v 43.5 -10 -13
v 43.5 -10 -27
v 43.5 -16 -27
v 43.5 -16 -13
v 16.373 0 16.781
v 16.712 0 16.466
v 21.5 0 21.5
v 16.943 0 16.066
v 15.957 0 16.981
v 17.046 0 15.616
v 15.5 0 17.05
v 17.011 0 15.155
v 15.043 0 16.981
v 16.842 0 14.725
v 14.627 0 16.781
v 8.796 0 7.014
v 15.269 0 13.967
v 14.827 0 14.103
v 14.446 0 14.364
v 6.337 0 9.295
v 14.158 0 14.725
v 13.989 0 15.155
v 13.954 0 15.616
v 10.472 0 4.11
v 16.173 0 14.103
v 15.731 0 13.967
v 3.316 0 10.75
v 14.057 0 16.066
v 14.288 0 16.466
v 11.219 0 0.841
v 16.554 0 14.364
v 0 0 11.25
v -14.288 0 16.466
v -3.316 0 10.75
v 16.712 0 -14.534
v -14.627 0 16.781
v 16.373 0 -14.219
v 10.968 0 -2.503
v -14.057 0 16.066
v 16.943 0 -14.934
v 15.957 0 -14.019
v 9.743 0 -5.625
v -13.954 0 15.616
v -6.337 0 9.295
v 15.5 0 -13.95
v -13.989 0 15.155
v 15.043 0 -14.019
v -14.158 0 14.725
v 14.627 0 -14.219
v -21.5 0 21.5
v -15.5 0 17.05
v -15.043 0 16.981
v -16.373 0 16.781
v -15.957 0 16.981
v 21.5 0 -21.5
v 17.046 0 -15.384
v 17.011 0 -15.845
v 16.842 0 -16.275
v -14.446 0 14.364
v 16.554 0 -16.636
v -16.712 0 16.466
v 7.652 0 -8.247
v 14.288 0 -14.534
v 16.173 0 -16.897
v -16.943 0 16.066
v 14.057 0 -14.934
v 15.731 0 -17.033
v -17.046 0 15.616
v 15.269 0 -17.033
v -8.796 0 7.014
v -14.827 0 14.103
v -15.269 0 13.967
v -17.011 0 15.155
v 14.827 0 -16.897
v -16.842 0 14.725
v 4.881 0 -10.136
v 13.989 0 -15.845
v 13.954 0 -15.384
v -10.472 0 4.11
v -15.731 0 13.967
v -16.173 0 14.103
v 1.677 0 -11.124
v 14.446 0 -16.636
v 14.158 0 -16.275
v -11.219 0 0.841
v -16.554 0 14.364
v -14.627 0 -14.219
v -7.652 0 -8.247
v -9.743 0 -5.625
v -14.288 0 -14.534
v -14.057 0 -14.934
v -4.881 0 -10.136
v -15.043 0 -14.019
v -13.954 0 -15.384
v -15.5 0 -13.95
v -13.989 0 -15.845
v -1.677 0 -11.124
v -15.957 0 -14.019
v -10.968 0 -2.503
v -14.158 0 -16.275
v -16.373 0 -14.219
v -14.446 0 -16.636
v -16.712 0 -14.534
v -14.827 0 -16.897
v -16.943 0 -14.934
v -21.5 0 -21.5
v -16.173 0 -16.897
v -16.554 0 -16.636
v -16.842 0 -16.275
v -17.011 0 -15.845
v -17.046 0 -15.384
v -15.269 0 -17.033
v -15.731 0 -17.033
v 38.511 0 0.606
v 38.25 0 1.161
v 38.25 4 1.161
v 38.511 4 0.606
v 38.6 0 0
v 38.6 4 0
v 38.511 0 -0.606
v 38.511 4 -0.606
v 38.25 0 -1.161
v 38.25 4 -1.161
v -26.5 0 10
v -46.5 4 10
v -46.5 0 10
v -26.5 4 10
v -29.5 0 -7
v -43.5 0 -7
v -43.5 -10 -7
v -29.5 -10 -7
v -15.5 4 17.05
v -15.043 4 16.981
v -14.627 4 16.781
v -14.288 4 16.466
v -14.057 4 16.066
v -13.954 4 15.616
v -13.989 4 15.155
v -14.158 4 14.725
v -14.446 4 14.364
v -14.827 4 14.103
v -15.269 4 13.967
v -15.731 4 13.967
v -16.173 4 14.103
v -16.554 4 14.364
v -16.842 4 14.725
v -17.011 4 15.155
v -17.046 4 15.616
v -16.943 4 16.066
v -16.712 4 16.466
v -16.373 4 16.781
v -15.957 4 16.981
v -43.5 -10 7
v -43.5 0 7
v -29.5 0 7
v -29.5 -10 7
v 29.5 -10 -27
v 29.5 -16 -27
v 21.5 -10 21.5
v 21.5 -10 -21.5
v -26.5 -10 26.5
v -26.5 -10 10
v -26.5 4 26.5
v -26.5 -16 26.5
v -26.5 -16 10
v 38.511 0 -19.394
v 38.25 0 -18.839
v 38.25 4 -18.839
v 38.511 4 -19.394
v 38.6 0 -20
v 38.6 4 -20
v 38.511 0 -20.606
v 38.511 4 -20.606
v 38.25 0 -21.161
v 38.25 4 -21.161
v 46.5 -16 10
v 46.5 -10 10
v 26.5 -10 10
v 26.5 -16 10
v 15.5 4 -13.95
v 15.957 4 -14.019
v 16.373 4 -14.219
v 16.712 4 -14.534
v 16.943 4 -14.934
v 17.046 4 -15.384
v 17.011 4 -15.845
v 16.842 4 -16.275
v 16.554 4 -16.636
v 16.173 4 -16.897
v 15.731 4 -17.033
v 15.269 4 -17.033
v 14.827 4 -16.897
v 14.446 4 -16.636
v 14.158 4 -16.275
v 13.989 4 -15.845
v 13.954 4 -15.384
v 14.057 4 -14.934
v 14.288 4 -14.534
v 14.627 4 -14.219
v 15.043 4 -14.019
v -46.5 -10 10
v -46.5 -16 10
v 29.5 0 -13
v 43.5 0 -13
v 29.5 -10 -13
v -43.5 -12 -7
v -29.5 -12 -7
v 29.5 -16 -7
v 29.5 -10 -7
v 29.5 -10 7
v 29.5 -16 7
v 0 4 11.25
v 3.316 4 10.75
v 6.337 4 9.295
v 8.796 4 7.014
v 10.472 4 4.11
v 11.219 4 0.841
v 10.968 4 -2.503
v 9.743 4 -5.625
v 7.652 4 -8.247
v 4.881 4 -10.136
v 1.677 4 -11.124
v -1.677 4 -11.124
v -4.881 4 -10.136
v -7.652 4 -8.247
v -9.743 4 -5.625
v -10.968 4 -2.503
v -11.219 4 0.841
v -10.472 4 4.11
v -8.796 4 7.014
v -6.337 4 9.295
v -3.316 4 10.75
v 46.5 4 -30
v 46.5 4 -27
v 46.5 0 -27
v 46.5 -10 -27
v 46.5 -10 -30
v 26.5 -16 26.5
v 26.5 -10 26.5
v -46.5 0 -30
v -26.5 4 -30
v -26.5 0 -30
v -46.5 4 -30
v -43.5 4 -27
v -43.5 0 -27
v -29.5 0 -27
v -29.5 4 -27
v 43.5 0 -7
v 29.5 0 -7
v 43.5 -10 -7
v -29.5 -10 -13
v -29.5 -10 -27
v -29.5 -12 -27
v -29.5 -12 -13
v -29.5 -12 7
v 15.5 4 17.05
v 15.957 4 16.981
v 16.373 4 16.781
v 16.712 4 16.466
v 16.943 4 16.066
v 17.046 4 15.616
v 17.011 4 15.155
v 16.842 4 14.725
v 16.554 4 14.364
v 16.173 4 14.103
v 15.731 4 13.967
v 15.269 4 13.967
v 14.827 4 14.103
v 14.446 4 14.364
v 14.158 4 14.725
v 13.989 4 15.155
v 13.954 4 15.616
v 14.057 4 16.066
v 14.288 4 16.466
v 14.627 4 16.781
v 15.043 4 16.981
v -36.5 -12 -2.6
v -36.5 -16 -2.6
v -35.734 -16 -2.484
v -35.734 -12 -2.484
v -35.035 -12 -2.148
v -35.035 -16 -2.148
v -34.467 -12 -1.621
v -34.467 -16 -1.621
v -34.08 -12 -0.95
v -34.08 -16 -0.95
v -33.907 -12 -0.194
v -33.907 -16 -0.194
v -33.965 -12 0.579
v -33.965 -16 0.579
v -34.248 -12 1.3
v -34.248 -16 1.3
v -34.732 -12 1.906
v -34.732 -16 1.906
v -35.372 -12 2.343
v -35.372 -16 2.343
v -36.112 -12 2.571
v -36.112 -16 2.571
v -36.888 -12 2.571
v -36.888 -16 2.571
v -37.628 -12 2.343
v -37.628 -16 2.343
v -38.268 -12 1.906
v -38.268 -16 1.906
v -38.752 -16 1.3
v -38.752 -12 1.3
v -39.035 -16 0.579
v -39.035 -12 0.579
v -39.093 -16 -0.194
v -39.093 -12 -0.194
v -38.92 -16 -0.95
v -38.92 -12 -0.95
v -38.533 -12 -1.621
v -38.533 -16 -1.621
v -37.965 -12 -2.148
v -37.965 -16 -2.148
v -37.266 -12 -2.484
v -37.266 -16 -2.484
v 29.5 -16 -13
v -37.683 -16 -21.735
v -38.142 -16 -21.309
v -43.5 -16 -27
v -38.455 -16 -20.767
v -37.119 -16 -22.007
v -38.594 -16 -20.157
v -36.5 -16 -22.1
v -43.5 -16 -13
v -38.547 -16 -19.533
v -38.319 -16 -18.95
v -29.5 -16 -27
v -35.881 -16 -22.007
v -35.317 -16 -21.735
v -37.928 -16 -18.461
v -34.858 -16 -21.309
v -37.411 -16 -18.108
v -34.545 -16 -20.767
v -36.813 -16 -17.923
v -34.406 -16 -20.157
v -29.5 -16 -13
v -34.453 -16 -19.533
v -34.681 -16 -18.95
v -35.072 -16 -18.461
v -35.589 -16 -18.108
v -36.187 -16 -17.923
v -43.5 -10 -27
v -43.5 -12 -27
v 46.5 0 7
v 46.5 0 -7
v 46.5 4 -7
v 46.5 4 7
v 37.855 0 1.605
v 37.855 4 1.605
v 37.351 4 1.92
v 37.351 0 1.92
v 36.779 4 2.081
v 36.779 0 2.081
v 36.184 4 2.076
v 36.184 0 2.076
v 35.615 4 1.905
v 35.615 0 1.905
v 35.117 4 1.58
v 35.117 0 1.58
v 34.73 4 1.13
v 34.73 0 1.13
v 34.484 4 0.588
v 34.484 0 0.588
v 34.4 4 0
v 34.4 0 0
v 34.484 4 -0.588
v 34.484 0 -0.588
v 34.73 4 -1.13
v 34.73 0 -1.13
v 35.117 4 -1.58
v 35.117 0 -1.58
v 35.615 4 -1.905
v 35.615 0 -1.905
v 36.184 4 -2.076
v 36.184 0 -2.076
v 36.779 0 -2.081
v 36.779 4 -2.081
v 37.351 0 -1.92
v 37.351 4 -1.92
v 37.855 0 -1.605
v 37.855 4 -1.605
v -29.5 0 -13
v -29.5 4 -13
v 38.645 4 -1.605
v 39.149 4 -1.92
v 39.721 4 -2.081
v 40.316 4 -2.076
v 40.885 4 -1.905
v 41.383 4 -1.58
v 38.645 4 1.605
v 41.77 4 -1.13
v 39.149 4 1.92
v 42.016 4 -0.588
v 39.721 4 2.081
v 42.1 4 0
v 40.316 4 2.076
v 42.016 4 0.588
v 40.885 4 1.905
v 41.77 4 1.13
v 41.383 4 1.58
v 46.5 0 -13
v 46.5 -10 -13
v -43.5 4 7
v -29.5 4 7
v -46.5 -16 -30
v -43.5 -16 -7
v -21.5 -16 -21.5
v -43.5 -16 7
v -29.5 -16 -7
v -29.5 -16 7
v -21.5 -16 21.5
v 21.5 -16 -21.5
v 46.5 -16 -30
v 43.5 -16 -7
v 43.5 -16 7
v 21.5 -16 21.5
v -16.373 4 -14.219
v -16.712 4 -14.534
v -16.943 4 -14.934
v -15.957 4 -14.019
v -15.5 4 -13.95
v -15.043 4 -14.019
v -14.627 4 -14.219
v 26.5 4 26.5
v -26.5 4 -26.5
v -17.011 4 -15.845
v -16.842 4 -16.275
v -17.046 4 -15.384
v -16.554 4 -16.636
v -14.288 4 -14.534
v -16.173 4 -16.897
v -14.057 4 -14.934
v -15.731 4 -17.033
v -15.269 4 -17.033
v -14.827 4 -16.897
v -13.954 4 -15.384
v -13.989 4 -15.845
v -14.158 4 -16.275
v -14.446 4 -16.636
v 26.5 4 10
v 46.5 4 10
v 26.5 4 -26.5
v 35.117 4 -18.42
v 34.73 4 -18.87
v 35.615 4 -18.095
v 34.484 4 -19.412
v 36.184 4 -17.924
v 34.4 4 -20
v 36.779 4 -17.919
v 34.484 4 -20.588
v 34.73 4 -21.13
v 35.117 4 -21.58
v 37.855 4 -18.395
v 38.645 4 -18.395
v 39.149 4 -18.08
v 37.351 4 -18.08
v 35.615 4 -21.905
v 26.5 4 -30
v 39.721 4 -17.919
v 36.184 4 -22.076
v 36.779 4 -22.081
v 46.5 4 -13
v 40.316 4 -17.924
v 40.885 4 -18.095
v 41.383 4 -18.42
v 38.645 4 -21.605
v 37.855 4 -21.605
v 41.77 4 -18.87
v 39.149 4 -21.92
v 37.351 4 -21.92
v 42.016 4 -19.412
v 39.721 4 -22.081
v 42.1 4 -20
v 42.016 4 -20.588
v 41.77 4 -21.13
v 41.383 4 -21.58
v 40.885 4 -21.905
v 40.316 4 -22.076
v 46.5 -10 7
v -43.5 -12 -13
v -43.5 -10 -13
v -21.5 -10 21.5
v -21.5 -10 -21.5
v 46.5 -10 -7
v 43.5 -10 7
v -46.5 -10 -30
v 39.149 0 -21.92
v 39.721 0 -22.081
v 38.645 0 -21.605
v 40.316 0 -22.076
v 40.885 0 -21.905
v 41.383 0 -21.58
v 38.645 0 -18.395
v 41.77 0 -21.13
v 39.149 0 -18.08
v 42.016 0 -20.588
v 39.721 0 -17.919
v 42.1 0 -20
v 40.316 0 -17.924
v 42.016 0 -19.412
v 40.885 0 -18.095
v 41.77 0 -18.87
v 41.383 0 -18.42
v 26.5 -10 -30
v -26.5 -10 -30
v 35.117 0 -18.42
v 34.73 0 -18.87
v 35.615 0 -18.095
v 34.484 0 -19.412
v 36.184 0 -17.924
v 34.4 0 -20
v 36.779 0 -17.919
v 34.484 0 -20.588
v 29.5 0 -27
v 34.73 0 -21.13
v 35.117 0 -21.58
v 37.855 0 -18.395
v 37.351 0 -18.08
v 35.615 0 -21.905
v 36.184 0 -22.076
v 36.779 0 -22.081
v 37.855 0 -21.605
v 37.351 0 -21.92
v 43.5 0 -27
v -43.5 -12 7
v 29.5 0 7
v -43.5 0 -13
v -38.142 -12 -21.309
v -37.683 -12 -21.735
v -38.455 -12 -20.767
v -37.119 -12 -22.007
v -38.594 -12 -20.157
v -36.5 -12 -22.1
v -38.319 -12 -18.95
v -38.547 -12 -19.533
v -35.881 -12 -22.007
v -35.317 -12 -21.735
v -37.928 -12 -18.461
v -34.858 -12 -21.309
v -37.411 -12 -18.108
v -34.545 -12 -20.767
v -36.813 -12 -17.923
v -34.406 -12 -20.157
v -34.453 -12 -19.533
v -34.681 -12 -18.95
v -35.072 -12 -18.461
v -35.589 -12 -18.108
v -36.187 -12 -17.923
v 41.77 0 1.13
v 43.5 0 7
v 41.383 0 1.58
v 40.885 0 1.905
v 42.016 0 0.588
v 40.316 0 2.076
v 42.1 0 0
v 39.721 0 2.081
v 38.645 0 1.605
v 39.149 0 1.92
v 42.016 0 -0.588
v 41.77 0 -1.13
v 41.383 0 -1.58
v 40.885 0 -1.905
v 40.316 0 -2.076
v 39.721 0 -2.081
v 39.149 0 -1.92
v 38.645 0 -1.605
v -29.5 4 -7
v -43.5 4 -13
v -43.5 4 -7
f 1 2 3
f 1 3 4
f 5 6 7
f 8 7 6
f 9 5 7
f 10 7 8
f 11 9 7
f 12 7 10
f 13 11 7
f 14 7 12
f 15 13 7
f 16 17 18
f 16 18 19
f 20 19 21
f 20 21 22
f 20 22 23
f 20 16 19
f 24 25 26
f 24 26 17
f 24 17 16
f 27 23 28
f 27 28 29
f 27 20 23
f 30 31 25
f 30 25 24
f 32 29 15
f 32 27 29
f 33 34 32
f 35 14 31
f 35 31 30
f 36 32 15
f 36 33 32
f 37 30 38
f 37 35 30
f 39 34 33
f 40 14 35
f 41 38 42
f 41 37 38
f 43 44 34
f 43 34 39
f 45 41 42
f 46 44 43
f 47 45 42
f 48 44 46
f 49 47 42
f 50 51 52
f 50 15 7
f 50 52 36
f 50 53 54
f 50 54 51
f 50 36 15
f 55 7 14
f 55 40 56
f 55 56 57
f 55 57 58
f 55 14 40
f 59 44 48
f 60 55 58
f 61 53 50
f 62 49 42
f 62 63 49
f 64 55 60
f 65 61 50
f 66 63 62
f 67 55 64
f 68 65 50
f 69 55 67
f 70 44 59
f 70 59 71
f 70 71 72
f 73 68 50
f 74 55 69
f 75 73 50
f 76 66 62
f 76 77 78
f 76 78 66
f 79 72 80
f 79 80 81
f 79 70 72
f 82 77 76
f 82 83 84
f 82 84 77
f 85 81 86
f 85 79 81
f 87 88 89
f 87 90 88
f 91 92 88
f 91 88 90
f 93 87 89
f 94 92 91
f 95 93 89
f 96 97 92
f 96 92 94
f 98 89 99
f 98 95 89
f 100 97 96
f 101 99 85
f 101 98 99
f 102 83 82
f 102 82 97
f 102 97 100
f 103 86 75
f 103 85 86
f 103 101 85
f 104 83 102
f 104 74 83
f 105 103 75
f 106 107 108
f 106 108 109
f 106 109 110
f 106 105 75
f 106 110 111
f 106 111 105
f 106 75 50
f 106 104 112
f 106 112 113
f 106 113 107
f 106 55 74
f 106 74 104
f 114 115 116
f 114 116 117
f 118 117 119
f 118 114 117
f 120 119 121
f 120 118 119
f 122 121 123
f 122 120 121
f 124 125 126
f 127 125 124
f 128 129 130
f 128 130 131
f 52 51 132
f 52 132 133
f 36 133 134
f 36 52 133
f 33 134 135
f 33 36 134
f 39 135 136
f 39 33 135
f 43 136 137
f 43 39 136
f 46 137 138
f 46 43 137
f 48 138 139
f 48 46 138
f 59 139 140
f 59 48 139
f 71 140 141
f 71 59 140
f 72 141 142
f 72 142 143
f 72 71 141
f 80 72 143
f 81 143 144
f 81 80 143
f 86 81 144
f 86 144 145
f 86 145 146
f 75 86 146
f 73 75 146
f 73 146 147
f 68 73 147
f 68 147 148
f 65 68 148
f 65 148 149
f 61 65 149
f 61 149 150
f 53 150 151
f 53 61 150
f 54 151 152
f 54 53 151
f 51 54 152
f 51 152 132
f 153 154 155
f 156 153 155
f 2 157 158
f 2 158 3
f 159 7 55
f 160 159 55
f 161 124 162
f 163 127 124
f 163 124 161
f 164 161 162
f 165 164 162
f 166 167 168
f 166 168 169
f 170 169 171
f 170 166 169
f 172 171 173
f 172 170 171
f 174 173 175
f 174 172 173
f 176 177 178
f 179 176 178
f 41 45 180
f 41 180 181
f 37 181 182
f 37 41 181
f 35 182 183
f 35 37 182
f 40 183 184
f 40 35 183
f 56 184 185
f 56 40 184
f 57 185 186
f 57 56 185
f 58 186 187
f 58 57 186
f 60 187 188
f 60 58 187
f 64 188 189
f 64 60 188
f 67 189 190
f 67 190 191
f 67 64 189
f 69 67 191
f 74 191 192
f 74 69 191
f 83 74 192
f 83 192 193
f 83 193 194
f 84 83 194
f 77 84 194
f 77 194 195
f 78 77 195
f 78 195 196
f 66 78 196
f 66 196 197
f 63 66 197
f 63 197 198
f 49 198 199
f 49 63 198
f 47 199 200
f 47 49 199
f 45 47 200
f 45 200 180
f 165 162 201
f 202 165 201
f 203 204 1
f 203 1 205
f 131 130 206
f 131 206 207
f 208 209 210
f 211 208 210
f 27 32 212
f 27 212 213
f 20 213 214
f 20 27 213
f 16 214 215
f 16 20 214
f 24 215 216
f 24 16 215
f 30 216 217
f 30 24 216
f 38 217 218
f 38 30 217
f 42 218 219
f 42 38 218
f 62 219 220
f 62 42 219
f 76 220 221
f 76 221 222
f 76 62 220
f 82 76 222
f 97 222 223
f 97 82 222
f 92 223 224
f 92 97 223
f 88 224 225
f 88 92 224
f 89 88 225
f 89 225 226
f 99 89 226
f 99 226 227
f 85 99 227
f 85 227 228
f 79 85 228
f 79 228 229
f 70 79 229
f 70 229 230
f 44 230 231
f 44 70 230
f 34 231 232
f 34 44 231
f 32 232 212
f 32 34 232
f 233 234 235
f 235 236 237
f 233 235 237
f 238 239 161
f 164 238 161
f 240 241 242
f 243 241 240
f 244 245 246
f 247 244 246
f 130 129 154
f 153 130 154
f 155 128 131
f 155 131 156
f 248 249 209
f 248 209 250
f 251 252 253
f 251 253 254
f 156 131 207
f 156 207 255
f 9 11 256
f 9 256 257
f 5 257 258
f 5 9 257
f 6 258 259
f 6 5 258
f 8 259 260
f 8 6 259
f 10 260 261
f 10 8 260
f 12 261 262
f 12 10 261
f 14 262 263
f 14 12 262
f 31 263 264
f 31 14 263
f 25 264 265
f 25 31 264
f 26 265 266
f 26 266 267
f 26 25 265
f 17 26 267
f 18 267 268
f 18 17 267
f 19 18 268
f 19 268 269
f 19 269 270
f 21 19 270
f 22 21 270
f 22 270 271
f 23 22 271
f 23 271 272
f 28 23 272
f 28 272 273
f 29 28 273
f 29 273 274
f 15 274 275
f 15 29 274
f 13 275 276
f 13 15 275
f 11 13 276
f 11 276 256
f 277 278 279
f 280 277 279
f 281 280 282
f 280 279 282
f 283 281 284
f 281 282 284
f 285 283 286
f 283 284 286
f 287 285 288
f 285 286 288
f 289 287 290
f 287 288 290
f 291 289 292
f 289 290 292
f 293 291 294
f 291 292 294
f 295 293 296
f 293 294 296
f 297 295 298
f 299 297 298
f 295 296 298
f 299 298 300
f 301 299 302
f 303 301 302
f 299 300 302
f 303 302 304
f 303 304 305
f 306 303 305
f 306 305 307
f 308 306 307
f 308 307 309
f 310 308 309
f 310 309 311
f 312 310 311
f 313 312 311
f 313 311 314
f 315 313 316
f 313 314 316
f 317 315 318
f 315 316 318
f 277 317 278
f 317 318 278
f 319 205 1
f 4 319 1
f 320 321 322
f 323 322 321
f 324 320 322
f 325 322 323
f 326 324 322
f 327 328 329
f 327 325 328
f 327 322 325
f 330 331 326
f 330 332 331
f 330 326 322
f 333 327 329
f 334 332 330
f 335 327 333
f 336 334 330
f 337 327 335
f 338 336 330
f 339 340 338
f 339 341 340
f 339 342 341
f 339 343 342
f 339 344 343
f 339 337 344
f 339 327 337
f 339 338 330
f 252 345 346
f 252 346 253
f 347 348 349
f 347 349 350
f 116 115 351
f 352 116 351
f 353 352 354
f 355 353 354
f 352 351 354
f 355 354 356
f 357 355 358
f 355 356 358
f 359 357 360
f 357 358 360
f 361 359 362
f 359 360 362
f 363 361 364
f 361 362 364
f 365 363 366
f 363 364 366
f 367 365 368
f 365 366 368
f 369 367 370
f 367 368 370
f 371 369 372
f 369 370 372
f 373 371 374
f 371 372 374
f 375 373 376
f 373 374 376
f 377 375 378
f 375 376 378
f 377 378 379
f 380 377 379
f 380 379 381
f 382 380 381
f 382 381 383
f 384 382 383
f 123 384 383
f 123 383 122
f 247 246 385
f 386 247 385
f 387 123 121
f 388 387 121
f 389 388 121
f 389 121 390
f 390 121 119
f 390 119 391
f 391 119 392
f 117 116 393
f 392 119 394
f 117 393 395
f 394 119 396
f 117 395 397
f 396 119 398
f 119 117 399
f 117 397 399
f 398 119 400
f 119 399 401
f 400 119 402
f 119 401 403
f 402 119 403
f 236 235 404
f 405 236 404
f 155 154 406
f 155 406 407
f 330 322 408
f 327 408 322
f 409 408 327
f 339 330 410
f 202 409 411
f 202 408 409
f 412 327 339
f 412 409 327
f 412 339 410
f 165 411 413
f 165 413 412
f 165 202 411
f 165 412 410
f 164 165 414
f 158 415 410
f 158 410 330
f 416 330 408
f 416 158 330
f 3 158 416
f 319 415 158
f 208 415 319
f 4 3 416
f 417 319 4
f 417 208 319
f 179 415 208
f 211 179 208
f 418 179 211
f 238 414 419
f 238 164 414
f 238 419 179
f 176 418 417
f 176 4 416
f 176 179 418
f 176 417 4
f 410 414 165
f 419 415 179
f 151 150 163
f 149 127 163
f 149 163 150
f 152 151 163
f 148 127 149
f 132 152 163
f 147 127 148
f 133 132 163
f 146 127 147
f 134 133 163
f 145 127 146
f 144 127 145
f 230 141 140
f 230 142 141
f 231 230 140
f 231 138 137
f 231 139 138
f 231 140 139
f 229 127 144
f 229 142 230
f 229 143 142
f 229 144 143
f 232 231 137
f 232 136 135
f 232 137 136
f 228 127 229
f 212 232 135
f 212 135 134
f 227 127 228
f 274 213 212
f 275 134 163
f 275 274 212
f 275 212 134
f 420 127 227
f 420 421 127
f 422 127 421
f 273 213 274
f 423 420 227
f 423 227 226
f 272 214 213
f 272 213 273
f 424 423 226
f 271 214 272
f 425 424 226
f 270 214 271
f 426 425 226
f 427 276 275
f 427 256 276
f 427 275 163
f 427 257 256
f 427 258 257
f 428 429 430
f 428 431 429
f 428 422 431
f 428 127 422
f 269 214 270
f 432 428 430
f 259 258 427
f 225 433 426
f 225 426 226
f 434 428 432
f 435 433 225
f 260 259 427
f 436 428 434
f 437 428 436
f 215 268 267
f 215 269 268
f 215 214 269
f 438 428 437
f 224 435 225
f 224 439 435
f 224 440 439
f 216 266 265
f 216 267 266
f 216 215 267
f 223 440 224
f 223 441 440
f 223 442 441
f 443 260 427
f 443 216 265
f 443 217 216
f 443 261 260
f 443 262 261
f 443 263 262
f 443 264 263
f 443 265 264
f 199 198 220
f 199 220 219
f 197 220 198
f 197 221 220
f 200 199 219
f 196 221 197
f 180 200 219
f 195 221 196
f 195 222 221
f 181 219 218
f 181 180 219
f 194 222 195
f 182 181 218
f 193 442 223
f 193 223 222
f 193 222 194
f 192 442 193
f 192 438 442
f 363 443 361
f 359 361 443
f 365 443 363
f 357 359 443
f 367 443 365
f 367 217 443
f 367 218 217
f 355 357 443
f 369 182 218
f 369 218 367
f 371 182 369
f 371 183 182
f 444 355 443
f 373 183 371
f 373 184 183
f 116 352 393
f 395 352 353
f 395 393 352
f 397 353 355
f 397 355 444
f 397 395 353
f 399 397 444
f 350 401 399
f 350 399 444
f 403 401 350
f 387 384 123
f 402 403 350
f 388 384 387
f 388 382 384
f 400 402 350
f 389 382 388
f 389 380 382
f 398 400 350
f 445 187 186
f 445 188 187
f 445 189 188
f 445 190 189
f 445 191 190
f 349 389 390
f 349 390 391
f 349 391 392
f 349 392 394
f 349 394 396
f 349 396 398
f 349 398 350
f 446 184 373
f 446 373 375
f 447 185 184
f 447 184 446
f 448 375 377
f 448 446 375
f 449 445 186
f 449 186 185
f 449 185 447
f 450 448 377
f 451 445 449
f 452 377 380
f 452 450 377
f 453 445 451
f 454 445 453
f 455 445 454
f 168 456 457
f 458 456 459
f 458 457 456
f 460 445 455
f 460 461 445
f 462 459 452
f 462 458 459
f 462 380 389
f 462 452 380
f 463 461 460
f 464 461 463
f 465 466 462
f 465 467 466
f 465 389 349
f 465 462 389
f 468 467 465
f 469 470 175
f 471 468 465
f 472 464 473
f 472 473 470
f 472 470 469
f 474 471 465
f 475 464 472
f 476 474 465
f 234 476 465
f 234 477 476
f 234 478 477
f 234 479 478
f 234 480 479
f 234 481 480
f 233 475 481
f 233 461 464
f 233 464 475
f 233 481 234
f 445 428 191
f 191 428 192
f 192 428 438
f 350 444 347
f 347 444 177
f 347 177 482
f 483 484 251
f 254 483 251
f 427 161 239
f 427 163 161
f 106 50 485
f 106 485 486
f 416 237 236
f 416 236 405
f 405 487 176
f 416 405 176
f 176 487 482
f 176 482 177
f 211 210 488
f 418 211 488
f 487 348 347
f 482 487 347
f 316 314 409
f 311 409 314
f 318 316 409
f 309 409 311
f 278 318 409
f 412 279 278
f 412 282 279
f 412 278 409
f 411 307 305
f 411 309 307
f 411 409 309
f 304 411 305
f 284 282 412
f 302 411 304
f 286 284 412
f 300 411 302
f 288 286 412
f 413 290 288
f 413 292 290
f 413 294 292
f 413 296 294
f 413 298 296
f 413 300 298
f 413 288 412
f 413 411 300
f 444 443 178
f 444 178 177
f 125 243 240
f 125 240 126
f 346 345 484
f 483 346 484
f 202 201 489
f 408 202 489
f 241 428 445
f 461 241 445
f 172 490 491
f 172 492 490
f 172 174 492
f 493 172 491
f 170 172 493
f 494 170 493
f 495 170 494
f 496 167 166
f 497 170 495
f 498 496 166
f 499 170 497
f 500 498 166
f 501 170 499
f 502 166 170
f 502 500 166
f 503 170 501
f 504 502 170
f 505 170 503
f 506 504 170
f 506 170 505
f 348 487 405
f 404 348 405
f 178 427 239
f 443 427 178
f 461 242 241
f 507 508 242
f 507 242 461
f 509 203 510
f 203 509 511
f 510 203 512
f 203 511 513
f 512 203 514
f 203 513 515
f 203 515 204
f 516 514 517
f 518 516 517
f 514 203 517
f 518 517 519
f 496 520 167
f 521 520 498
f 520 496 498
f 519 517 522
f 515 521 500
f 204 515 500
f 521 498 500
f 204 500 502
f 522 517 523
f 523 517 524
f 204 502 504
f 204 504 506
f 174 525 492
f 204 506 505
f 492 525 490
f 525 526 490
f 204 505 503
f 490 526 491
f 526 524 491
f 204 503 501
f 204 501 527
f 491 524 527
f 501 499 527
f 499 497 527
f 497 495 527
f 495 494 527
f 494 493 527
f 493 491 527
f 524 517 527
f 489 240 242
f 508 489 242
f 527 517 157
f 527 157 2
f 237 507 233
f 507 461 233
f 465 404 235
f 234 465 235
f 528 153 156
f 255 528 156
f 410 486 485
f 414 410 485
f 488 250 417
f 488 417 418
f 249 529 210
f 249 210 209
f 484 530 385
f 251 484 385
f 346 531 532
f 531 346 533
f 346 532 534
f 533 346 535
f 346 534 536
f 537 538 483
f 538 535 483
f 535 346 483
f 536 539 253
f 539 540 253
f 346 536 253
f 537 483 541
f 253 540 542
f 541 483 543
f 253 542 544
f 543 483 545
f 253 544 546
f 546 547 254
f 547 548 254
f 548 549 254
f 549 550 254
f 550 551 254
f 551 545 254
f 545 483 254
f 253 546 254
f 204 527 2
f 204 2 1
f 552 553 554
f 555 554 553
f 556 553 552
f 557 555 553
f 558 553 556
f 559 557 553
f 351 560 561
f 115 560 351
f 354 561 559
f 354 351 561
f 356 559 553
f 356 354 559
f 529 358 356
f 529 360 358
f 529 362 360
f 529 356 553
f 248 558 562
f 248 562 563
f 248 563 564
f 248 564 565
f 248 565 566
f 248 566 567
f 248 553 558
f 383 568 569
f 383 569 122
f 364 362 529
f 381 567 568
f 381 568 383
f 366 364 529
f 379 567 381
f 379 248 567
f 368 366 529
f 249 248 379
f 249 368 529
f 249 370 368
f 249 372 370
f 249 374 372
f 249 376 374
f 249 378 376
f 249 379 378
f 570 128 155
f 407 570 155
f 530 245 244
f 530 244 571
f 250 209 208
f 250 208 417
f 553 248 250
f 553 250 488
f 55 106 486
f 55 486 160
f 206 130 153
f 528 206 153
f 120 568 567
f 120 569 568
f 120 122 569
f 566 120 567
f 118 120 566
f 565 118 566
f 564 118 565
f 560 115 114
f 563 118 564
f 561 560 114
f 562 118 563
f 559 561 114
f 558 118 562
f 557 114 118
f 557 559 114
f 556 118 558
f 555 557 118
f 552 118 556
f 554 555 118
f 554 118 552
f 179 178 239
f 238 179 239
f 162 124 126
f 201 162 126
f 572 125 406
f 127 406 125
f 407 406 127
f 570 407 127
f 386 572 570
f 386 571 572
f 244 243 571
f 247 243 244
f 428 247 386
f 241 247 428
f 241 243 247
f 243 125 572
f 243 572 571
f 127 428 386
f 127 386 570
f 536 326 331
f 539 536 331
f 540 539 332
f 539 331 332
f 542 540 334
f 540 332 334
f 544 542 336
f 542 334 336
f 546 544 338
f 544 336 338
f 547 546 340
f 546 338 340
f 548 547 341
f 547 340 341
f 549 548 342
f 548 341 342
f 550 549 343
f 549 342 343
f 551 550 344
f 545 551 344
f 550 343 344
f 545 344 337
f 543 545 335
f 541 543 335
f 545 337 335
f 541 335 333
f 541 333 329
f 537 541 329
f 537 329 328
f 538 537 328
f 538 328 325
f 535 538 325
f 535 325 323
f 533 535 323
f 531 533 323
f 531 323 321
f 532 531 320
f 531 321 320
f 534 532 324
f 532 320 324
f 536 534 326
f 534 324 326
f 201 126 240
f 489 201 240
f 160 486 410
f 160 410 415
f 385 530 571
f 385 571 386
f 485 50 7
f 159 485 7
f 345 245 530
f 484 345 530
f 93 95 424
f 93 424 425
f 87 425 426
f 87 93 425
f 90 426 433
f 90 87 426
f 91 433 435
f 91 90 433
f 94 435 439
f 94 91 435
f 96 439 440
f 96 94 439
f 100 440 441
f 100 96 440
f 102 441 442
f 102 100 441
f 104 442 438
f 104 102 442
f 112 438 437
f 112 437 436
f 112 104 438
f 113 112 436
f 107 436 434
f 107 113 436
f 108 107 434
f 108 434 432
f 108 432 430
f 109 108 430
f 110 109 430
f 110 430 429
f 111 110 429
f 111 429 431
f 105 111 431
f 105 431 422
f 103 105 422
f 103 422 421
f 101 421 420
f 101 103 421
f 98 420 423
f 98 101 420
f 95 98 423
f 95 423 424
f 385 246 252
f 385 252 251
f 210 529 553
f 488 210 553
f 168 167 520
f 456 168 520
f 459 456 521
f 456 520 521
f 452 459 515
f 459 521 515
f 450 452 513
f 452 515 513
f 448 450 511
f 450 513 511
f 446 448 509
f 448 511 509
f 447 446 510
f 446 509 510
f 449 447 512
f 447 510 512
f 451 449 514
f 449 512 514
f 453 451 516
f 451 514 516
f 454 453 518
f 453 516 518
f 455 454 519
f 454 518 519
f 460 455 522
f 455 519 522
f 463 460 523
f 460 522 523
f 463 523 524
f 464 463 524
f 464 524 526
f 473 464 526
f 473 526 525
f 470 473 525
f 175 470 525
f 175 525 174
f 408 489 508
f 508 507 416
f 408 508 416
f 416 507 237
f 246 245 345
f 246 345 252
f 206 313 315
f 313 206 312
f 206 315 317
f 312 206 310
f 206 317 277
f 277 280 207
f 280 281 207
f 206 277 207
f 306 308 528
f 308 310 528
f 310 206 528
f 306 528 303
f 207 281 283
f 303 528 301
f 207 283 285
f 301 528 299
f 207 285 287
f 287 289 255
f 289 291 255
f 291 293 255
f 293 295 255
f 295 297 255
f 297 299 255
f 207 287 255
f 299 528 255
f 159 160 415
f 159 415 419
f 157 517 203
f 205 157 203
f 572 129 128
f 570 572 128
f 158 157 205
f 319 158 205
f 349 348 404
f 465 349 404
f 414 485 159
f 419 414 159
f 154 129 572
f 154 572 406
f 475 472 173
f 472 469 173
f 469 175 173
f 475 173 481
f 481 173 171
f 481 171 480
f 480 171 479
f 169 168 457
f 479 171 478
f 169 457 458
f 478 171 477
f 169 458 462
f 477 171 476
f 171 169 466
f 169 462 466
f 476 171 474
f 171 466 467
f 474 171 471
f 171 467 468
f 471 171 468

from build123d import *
from build123d.topology import SkipClean

# Parameters (mm, degrees)
SKETCH2_R            = 11.25
SKETCH2_R_2          = 1.55
SKETCH2_R_3          = 2.1
BOSS_EXTRUDE1_DEPTH  = 4
SKETCH3_W            = 57.5
SKETCH3_H            = 14
SKETCH3_W_2          = 43
SKETCH3_H_2          = 43
BOSS_EXTRUDE2_DEPTH  = 10
SKETCH4_W            = 63.5
SKETCH4_H            = 20
SKETCH4_R            = 2.1
BOSS_EXTRUDE3_DEPTH  = 4
BOSS_EXTRUDE4_DEPTH  = 10
SKETCH6_W            = 20
SKETCH6_H            = 40
CUT_EXTRUDE1_DEPTH   = 31
SKETCH7_W            = 3
SKETCH7_H            = 40
BOSS_EXTRUDE5_DEPTH  = 10
SKETCH8_W            = 20
SKETCH8_H            = 40
CUT_EXTRUDE2_DEPTH   = 31
SKETCH9_W            = 3
SKETCH9_H            = 34
BOSS_EXTRUDE6_DEPTH  = 10
SKETCH10_R           = 2.1
CUT_EXTRUDE3_DEPTH   = 31
BOSS_EXTRUDE7_DEPTH  = 4
SKETCH12_W           = 0.5
SKETCH12_H           = 14
CUT_EXTRUDE4_DEPTH   = 31
SKETCH13_W           = 3
SKETCH13_H           = 34
BOSS_EXTRUDE8_DEPTH  = 10
SKETCH15_R           = 2.1
BOSS_EXTRUDE9_DEPTH  = 4
SKETCH16_W           = 14
SKETCH16_H           = 34
SKETCH16_H_2         = 3
BOSS_EXTRUDE10_DEPTH = 10
SKETCH17_W           = 53
SKETCH17_H           = 3.5
BOSS_EXTRUDE11_DEPTH = 14
SKETCH19_W           = 43
SKETCH19_H           = 43
SKETCH19_W_2         = 14
SKETCH19_H_2         = 14
BOSS_EXTRUDE12_DEPTH = 6
SKETCH20_W           = 14
SKETCH20_H           = 14
CUT_EXTRUDE5_DEPTH   = 6
SKETCH21_W           = 14
SKETCH21_H           = 14
SKETCH21_R           = 2.1
SKETCH21_R_2         = 2.6
BOSS_EXTRUDE13_DEPTH = 4


with BuildPart() as part:
    # Sketch2 → Boss-Extrude1 (new body)
    with BuildSketch(Plane(origin=(0, 0, 0), x_dir=(1, 0, 0), z_dir=(0, 1, 0))):
        Polygon((-26.5, 26.5), (26.5, 26.5), (26.5, 10), (90, 10), (90, -10), (26.5, -10), (26.5, -26.5), (-26.5, -26.5), align=None)
        with Locations(Location((0, 0, 0), (0, 0, 270))):
            Circle(SKETCH2_R, mode=Mode.SUBTRACT)
        with Locations(Location((-15.5, 15.5, 0), (0, 0, 270))):
            Circle(SKETCH2_R_2, mode=Mode.SUBTRACT)
        with Locations(Location((15.5, 15.5, 0), (0, 0, 270))):
            Circle(SKETCH2_R_2, mode=Mode.SUBTRACT)
        with Locations(Location((15.5, -15.5, 0), (0, 0, 270))):
            Circle(SKETCH2_R_2, mode=Mode.SUBTRACT)
        with Locations(Location((-15.5, -15.5, 0), (0, 0, 270))):
            Circle(SKETCH2_R_2, mode=Mode.SUBTRACT)
        with Locations(Location((40, 0, 0), (0, 0, 270))):
            Circle(SKETCH2_R_3, mode=Mode.SUBTRACT)
        with Locations(Location((60, 0, 0), (0, 0, 270))):
            Circle(SKETCH2_R_3, mode=Mode.SUBTRACT)
        with Locations(Location((80, 0, 0), (0, 0, 270))):
            Circle(SKETCH2_R_3, mode=Mode.SUBTRACT)
    extrude(amount=BOSS_EXTRUDE1_DEPTH)

    # Sketch3 → Boss-Extrude2 (add)
    with BuildSketch(Plane(origin=(0, 0, 0), x_dir=(1, 0, 0), z_dir=(0, 1, 0))):
        Polygon((-26.5, -26.5), (26.5, -26.5), (26.5, -10), (90, -10), (90, 10), (26.5, 10), (26.5, 26.5), (-26.5, 26.5), align=None)
        with Locations((58.25, 0)):
            Rectangle(SKETCH3_W, SKETCH3_H, mode=Mode.SUBTRACT)
        Rectangle(SKETCH3_W_2, SKETCH3_H_2, mode=Mode.SUBTRACT)
    extrude(amount=-BOSS_EXTRUDE2_DEPTH)

    # Sketch4 → Boss-Extrude3 (add)
    with BuildSketch(Plane(origin=(0, 4, 0), x_dir=(1, 0, 0), z_dir=(0, 1, 0))):
        with Locations((58.25, 20)):
            Rectangle(SKETCH4_W, SKETCH4_H)
        with Locations(Location((80, 20, 0), (0, 0, 270))):
            Circle(SKETCH4_R, mode=Mode.SUBTRACT)
        with Locations(Location((60, 20, 0), (0, 0, 270))):
            Circle(SKETCH4_R, mode=Mode.SUBTRACT)
        with Locations(Location((40, 20, 0), (0, 0, 270))):
            Circle(SKETCH4_R, mode=Mode.SUBTRACT)
    extrude(amount=-BOSS_EXTRUDE3_DEPTH)

    # Sketch5 → Boss-Extrude4 (add)
    with BuildSketch(Plane.XZ):
        Polygon((90, -10), (26.5, -10), (26.5, -26.5), (26.5, -30), (90, -30), align=None)
        Polygon((87, -13), (29.5, -13), (29.5, -26.5), (29.5, -27), (87, -27), align=None, mode=Mode.SUBTRACT)
    extrude(amount=BOSS_EXTRUDE4_DEPTH)

    # Sketch6 → Cut-Extrude1 (cut)
    with BuildSketch(Plane.XZ.offset(10)):
        with Locations((80, -10)):
            Rectangle(SKETCH6_W, SKETCH6_H)
    extrude(amount=-CUT_EXTRUDE1_DEPTH, mode=Mode.SUBTRACT)

    # Sketch7 → Boss-Extrude5 (add)
    with BuildSketch(Plane.XZ):
        with Locations((68.5, -10)):
            Rectangle(SKETCH7_W, SKETCH7_H)
    extrude(amount=BOSS_EXTRUDE5_DEPTH)

    # Sketch8 → Cut-Extrude2 (cut)
    with BuildSketch(Plane.XZ.offset(10)):
        with Locations((60, -10)):
            Rectangle(SKETCH8_W, SKETCH8_H)
    extrude(amount=-CUT_EXTRUDE2_DEPTH, mode=Mode.SUBTRACT)

    # Sketch9 → Boss-Extrude6 (add)
    with BuildSketch(Plane.XZ):
        with Locations((48.5, -10)):
            Rectangle(SKETCH9_W, SKETCH9_H)
    extrude(amount=BOSS_EXTRUDE6_DEPTH)

    # Sketch10 → Cut-Extrude3 (cut)
    with BuildSketch(Plane.XZ.offset(10)):
        with Locations((36.5, -20)):
            Circle(SKETCH10_R)
        with Locations((36.5, 0)):
            Circle(SKETCH10_R)
    extrude(amount=-CUT_EXTRUDE3_DEPTH, mode=Mode.SUBTRACT)

    # Sketch11 → Boss-Extrude7 (add)
    with SkipClean():  # the faces are left unmerged after this step: merging them gives an invalid solid
        with BuildSketch(Plane.XZ):
            with BuildLine():
                ThreePointArc((38.25, -18.839181323), (38.6, -20), (38.25, -21.160818677))
                ThreePointArc((38.25, -21.160818677), (42.1, -20), (38.25, -18.839181323))
            make_face()
            with BuildLine():
                ThreePointArc((38.25, -1.160818677), (42.1, 0), (38.25, 1.160818677))
                ThreePointArc((38.25, 1.160818677), (38.6, 0), (38.25, -1.160818677))
            make_face()
        extrude(amount=-BOSS_EXTRUDE7_DEPTH)

    # Sketch12 → Cut-Extrude4 (cut)
    with SkipClean():  # the faces are left unmerged after this step: merging them gives an invalid solid
        with BuildSketch(Plane.XZ.offset(10)):
            Polygon((50, -30), (46.5, -30), (46.5, -36.524115579), (58.005951577, -36.524115579), (58.005951577, 17.068151821), (46.5, 17.068151821), (46.5, 10), (50, 10), align=None)
            Polygon((47, -27), (46.5, -27), (46.5, -30), (50, -30), (50, 10), (46.5, 10), (46.5, 7), (47, 7), (47, -7), (46.5, -7), (46.5, -13), (47, -13), align=None)
            Polygon((46.5, -13), (46.5, -20), (46.5, -27), (47, -27), (47, -13), align=None)
            with Locations((46.75, 0)):
                Rectangle(SKETCH12_W, SKETCH12_H)
        extrude(amount=-CUT_EXTRUDE4_DEPTH, mode=Mode.SUBTRACT)

    # Sketch13 → Boss-Extrude8 (add)
    with SkipClean():  # the faces are left unmerged after this step: merging them gives an invalid solid
        with BuildSketch(Plane.XZ):
            with Locations((45, -10)):
                Rectangle(SKETCH13_W, SKETCH13_H)
        extrude(amount=BOSS_EXTRUDE8_DEPTH)

    # Sketch15 → Boss-Extrude9 (add)
    with SkipClean():  # the faces are left unmerged after this step: merging them gives an invalid solid
        with BuildSketch(Plane(origin=(0, 4, 0), x_dir=(1, 0, 0), z_dir=(0, 1, 0))):
            Polygon((-26.5, 30), (-46.5, 30), (-46.5, -10), (-26.5, -10), (-26.5, 26.5), align=None)
            with Locations(Location((-36.5, 0, 0), (0, 0, 270))):
                Circle(SKETCH15_R, mode=Mode.SUBTRACT)
            with Locations(Location((-36.5, 20, 0), (0, 0, 270))):
                Circle(SKETCH15_R, mode=Mode.SUBTRACT)
        extrude(amount=-BOSS_EXTRUDE9_DEPTH)

    # Sketch16 → Boss-Extrude10 (add)
    # profile 1 of 3: a face of its own
    with SkipClean():  # the faces are left unmerged after this step: merging them gives an invalid solid
        with BuildSketch(Plane.XZ):
            Polygon((-46.5, 10), (-46.5, -30), (-26.5, -30), (-26.5, -26.5), (-26.5, 10), align=None)
            with Locations((-36.5, -10)):
                Rectangle(SKETCH16_W, SKETCH16_H, mode=Mode.SUBTRACT)
        # profile 2 of 3: a face of its own
        with BuildSketch(Plane.XZ):
            with Locations((-36.5, -11.5)):
                Rectangle(SKETCH16_W, SKETCH16_H_2)
        # profile 3 of 3: a face of its own
        with BuildSketch(Plane.XZ):
            with Locations((-36.5, -8.5)):
                Rectangle(SKETCH16_W, SKETCH16_H_2)
        extrude(amount=BOSS_EXTRUDE10_DEPTH)

    # Sketch17 → Boss-Extrude11 (add)
    with SkipClean():  # the faces are left unmerged after this step: merging them gives an invalid solid
        with BuildSketch(Plane.XZ.offset(10)):
            with Locations((0, -28.25)):
                Rectangle(SKETCH17_W, SKETCH17_H)
        extrude(amount=-BOSS_EXTRUDE11_DEPTH)

    # Sketch19 → Boss-Extrude12 (add)
    with SkipClean():  # the faces are left unmerged after this step: merging them gives an invalid solid
        with BuildSketch(Plane.XZ.offset(10)):
            Polygon((-46.5, 10), (-46.5, -30), (46.5, -30), (46.5, 10), (26.5, 10), (26.5, 26.5), (-26.5, 26.5), (-26.5, 10), align=None)
            Rectangle(SKETCH19_W, SKETCH19_H, mode=Mode.SUBTRACT)
            with Locations((36.5, -20)):
                Rectangle(SKETCH19_W_2, SKETCH19_H_2, mode=Mode.SUBTRACT)
            with Locations((36.5, 0)):
                Rectangle(SKETCH19_W_2, SKETCH19_H_2, mode=Mode.SUBTRACT)
            with Locations((-36.5, -20)):
                Rectangle(SKETCH19_W_2, SKETCH19_H_2, mode=Mode.SUBTRACT)
            with Locations((-36.5, 0)):
                Rectangle(SKETCH19_W_2, SKETCH19_H_2, mode=Mode.SUBTRACT)
        extrude(amount=BOSS_EXTRUDE12_DEPTH)

    # Sketch20 → Cut-Extrude5 (cut)
    with SkipClean():  # the faces are left unmerged after this step: merging them gives an invalid solid
        with BuildSketch(Plane.XZ):
            with Locations((-36.5, -20)):
                Rectangle(SKETCH20_W, SKETCH20_H)
            with Locations((-36.5, 0)):
                Rectangle(SKETCH20_W, SKETCH20_H)
        extrude(amount=-CUT_EXTRUDE5_DEPTH, mode=Mode.SUBTRACT)

    # Sketch21 → Boss-Extrude13 (add)
    # profile 1 of 2: a face of its own
    with SkipClean():  # the faces are left unmerged after this step: merging them gives an invalid solid
        with BuildSketch(Plane.XZ.offset(16)):
            with Locations((-36.5, -20)):
                Rectangle(SKETCH21_W, SKETCH21_H)
            with Locations(Location((-36.5, -20, 0), (0, 0, 270))):
                Circle(SKETCH21_R, mode=Mode.SUBTRACT)
        # profile 2 of 2: a face of its own
        with BuildSketch(Plane.XZ.offset(16)):
            with Locations((-36.5, 0)):
                Rectangle(SKETCH21_W, SKETCH21_H)
            with Locations(Location((-36.5, 0, 0), (0, 0, 270))):
                Circle(SKETCH21_R_2, mode=Mode.SUBTRACT)
        extrude(amount=-BOSS_EXTRUDE13_DEPTH)


solid = part.part
